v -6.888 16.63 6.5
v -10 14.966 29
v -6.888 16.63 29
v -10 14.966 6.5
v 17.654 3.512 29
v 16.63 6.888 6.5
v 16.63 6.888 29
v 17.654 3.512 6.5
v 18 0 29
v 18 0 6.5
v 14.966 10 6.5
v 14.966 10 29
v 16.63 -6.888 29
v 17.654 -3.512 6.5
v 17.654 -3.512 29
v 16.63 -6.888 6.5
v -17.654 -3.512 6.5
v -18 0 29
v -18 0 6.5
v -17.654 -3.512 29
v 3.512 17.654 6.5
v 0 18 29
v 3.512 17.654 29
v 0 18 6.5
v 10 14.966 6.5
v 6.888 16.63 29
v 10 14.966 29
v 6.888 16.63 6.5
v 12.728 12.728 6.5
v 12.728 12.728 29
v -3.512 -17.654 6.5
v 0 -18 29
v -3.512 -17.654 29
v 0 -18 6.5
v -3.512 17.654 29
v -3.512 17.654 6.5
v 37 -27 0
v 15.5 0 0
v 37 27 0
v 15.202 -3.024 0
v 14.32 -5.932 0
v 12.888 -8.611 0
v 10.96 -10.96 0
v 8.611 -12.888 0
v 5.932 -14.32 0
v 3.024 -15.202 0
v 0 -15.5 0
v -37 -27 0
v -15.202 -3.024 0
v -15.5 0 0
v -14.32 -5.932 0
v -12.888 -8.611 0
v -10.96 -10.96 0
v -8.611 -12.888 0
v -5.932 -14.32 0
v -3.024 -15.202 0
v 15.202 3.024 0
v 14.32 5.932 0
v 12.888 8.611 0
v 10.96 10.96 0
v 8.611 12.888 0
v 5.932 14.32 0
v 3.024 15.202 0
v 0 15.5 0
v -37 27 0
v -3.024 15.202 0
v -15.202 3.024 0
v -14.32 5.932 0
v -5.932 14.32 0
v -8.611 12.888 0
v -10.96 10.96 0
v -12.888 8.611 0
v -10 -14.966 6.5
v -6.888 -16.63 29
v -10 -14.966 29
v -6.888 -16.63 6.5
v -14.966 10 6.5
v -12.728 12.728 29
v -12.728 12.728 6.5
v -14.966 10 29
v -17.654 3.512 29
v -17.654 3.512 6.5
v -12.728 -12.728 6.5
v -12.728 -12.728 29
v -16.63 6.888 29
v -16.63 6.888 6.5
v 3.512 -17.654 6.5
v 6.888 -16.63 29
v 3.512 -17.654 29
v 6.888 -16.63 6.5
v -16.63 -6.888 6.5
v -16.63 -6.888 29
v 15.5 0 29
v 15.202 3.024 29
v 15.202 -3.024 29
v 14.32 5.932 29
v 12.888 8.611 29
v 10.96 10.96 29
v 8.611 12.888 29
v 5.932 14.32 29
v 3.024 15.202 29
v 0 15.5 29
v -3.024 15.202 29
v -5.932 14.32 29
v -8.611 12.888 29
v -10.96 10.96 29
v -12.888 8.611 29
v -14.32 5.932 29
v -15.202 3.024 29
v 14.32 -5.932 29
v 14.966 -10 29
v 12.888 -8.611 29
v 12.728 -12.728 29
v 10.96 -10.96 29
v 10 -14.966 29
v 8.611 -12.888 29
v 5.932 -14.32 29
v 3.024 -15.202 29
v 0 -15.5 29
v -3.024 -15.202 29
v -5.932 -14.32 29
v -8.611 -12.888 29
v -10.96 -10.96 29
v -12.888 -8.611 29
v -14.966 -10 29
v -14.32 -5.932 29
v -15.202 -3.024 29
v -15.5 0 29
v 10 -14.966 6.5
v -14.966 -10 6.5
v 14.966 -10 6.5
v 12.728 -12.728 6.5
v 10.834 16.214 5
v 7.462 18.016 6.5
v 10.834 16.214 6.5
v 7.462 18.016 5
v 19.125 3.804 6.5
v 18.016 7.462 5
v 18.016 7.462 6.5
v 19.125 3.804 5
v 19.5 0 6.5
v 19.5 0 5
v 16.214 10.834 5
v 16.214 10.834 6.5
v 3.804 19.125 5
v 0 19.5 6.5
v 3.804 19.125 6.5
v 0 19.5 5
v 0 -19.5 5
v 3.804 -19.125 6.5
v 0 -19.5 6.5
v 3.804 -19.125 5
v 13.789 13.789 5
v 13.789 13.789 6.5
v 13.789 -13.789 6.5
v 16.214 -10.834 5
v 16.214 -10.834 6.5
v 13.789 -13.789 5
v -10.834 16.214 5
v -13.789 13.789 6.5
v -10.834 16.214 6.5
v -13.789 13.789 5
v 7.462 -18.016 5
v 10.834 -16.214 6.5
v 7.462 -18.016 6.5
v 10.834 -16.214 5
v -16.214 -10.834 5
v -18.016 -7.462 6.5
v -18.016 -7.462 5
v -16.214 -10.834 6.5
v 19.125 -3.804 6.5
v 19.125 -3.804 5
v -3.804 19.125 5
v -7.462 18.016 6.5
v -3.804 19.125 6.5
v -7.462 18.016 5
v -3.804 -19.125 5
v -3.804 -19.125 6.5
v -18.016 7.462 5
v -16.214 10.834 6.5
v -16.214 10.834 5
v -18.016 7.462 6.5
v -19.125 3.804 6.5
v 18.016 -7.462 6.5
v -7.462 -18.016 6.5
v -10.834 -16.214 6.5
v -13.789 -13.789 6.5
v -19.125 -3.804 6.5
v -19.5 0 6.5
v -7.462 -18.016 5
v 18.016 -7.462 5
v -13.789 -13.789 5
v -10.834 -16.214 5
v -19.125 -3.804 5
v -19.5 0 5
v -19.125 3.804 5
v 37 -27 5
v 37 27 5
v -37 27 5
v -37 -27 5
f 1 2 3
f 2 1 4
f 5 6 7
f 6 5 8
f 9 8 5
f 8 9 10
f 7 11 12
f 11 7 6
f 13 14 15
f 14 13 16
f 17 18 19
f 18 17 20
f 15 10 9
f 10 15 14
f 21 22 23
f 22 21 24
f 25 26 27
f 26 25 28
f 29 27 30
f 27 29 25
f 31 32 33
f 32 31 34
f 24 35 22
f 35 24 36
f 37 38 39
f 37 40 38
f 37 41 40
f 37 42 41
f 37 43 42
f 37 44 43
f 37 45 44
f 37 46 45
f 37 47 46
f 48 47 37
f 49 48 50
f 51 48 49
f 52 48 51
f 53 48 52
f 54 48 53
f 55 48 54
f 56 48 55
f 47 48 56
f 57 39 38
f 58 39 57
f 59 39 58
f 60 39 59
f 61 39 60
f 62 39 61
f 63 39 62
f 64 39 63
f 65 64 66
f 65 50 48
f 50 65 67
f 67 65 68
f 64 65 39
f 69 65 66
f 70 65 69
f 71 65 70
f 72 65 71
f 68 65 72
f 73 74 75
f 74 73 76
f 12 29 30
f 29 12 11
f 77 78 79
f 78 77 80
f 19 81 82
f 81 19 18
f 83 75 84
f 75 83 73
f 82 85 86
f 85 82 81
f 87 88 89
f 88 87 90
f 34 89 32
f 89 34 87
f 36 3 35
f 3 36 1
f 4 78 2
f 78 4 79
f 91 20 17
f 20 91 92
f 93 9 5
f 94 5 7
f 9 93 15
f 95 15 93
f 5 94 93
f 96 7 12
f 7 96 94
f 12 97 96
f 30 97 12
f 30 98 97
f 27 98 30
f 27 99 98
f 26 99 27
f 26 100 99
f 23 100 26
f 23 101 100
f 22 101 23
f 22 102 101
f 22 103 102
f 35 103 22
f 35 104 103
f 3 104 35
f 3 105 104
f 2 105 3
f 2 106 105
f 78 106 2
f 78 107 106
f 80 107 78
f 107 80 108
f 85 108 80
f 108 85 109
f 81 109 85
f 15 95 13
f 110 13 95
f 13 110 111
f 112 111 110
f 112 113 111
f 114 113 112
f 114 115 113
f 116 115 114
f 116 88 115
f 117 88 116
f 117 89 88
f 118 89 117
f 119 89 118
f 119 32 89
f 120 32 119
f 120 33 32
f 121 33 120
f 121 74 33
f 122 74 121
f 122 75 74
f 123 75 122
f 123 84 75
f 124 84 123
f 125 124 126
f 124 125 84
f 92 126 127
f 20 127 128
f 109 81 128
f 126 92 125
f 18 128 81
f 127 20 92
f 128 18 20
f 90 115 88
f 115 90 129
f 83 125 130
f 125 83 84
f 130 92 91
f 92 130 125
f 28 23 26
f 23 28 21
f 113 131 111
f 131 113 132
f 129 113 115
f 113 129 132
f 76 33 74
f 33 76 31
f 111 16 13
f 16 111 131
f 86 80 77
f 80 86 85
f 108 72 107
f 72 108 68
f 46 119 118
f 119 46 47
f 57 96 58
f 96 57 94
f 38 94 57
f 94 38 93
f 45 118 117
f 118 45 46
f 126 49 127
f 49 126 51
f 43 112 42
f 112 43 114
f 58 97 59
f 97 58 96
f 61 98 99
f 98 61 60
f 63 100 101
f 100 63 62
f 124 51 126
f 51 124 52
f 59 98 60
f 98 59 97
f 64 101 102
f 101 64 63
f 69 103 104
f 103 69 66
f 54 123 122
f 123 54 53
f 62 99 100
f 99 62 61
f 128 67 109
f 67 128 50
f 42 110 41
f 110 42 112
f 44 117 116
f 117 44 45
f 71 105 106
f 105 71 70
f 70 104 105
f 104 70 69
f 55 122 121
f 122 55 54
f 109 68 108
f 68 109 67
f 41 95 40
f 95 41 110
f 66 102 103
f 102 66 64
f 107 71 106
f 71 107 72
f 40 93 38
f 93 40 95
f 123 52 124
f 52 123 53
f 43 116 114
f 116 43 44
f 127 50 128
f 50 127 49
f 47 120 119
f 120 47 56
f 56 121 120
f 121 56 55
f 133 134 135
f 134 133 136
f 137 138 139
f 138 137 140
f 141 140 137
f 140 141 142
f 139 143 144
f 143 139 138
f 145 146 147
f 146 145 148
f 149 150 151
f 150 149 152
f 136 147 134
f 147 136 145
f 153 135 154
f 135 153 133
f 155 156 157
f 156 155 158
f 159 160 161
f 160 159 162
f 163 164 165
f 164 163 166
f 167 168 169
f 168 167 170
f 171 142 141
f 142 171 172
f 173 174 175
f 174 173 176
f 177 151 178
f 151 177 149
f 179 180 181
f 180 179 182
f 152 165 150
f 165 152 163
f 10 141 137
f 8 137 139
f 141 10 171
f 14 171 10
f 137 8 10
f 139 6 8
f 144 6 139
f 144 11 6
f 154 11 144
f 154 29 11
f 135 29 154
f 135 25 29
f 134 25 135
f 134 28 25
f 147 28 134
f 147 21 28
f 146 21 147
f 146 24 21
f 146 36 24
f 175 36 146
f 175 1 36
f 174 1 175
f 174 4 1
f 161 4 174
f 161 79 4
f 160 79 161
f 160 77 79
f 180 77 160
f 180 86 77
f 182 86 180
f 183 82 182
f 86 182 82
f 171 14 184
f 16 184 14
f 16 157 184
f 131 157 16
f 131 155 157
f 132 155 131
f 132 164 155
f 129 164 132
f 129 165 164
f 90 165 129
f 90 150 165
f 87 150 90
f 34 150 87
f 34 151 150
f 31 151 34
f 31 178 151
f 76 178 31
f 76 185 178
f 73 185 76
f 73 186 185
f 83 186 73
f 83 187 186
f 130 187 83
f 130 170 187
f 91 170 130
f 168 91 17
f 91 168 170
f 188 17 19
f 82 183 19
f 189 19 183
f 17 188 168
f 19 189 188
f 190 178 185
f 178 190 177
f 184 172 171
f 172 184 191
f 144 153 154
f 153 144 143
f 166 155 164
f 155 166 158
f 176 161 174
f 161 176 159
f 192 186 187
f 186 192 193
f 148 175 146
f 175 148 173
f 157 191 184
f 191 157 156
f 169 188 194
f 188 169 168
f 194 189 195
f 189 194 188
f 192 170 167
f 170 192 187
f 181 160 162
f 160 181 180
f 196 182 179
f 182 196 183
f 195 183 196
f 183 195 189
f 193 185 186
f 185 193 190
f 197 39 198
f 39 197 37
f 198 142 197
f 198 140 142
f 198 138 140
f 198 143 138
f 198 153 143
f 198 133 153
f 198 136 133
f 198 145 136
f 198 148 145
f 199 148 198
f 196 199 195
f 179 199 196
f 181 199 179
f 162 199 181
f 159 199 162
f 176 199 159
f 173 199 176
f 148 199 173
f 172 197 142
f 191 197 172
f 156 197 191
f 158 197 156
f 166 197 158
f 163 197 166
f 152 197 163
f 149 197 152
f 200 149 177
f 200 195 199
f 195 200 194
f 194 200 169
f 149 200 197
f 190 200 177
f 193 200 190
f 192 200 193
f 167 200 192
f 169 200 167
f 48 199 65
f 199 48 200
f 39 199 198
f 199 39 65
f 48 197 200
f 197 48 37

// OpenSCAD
$fn = 32;
layer_width = 0.4;

cylinder_d = 36;
cylinder_h = 29;
cylinder_thickness = 5;

top_h = 5;

module part1() {
  difference() {
    cylinder(d = cylinder_d, h = cylinder_h);
    translate([0, 0, -1])
      cylinder(d = cylinder_d - cylinder_thickness, h = cylinder_h + 2);
  }
}

module part2() {
  difference() {
    union() {
      cylinder(d = 39, h = top_h + 1.5);
      translate([-74 / 2, -54 / 2, 0])
        cube([74, 54, top_h]);
    }
    translate([0, 0, -5])
      cylinder(d = cylinder_d, h = top_h + 10);
  }
}

part1();
part2();
